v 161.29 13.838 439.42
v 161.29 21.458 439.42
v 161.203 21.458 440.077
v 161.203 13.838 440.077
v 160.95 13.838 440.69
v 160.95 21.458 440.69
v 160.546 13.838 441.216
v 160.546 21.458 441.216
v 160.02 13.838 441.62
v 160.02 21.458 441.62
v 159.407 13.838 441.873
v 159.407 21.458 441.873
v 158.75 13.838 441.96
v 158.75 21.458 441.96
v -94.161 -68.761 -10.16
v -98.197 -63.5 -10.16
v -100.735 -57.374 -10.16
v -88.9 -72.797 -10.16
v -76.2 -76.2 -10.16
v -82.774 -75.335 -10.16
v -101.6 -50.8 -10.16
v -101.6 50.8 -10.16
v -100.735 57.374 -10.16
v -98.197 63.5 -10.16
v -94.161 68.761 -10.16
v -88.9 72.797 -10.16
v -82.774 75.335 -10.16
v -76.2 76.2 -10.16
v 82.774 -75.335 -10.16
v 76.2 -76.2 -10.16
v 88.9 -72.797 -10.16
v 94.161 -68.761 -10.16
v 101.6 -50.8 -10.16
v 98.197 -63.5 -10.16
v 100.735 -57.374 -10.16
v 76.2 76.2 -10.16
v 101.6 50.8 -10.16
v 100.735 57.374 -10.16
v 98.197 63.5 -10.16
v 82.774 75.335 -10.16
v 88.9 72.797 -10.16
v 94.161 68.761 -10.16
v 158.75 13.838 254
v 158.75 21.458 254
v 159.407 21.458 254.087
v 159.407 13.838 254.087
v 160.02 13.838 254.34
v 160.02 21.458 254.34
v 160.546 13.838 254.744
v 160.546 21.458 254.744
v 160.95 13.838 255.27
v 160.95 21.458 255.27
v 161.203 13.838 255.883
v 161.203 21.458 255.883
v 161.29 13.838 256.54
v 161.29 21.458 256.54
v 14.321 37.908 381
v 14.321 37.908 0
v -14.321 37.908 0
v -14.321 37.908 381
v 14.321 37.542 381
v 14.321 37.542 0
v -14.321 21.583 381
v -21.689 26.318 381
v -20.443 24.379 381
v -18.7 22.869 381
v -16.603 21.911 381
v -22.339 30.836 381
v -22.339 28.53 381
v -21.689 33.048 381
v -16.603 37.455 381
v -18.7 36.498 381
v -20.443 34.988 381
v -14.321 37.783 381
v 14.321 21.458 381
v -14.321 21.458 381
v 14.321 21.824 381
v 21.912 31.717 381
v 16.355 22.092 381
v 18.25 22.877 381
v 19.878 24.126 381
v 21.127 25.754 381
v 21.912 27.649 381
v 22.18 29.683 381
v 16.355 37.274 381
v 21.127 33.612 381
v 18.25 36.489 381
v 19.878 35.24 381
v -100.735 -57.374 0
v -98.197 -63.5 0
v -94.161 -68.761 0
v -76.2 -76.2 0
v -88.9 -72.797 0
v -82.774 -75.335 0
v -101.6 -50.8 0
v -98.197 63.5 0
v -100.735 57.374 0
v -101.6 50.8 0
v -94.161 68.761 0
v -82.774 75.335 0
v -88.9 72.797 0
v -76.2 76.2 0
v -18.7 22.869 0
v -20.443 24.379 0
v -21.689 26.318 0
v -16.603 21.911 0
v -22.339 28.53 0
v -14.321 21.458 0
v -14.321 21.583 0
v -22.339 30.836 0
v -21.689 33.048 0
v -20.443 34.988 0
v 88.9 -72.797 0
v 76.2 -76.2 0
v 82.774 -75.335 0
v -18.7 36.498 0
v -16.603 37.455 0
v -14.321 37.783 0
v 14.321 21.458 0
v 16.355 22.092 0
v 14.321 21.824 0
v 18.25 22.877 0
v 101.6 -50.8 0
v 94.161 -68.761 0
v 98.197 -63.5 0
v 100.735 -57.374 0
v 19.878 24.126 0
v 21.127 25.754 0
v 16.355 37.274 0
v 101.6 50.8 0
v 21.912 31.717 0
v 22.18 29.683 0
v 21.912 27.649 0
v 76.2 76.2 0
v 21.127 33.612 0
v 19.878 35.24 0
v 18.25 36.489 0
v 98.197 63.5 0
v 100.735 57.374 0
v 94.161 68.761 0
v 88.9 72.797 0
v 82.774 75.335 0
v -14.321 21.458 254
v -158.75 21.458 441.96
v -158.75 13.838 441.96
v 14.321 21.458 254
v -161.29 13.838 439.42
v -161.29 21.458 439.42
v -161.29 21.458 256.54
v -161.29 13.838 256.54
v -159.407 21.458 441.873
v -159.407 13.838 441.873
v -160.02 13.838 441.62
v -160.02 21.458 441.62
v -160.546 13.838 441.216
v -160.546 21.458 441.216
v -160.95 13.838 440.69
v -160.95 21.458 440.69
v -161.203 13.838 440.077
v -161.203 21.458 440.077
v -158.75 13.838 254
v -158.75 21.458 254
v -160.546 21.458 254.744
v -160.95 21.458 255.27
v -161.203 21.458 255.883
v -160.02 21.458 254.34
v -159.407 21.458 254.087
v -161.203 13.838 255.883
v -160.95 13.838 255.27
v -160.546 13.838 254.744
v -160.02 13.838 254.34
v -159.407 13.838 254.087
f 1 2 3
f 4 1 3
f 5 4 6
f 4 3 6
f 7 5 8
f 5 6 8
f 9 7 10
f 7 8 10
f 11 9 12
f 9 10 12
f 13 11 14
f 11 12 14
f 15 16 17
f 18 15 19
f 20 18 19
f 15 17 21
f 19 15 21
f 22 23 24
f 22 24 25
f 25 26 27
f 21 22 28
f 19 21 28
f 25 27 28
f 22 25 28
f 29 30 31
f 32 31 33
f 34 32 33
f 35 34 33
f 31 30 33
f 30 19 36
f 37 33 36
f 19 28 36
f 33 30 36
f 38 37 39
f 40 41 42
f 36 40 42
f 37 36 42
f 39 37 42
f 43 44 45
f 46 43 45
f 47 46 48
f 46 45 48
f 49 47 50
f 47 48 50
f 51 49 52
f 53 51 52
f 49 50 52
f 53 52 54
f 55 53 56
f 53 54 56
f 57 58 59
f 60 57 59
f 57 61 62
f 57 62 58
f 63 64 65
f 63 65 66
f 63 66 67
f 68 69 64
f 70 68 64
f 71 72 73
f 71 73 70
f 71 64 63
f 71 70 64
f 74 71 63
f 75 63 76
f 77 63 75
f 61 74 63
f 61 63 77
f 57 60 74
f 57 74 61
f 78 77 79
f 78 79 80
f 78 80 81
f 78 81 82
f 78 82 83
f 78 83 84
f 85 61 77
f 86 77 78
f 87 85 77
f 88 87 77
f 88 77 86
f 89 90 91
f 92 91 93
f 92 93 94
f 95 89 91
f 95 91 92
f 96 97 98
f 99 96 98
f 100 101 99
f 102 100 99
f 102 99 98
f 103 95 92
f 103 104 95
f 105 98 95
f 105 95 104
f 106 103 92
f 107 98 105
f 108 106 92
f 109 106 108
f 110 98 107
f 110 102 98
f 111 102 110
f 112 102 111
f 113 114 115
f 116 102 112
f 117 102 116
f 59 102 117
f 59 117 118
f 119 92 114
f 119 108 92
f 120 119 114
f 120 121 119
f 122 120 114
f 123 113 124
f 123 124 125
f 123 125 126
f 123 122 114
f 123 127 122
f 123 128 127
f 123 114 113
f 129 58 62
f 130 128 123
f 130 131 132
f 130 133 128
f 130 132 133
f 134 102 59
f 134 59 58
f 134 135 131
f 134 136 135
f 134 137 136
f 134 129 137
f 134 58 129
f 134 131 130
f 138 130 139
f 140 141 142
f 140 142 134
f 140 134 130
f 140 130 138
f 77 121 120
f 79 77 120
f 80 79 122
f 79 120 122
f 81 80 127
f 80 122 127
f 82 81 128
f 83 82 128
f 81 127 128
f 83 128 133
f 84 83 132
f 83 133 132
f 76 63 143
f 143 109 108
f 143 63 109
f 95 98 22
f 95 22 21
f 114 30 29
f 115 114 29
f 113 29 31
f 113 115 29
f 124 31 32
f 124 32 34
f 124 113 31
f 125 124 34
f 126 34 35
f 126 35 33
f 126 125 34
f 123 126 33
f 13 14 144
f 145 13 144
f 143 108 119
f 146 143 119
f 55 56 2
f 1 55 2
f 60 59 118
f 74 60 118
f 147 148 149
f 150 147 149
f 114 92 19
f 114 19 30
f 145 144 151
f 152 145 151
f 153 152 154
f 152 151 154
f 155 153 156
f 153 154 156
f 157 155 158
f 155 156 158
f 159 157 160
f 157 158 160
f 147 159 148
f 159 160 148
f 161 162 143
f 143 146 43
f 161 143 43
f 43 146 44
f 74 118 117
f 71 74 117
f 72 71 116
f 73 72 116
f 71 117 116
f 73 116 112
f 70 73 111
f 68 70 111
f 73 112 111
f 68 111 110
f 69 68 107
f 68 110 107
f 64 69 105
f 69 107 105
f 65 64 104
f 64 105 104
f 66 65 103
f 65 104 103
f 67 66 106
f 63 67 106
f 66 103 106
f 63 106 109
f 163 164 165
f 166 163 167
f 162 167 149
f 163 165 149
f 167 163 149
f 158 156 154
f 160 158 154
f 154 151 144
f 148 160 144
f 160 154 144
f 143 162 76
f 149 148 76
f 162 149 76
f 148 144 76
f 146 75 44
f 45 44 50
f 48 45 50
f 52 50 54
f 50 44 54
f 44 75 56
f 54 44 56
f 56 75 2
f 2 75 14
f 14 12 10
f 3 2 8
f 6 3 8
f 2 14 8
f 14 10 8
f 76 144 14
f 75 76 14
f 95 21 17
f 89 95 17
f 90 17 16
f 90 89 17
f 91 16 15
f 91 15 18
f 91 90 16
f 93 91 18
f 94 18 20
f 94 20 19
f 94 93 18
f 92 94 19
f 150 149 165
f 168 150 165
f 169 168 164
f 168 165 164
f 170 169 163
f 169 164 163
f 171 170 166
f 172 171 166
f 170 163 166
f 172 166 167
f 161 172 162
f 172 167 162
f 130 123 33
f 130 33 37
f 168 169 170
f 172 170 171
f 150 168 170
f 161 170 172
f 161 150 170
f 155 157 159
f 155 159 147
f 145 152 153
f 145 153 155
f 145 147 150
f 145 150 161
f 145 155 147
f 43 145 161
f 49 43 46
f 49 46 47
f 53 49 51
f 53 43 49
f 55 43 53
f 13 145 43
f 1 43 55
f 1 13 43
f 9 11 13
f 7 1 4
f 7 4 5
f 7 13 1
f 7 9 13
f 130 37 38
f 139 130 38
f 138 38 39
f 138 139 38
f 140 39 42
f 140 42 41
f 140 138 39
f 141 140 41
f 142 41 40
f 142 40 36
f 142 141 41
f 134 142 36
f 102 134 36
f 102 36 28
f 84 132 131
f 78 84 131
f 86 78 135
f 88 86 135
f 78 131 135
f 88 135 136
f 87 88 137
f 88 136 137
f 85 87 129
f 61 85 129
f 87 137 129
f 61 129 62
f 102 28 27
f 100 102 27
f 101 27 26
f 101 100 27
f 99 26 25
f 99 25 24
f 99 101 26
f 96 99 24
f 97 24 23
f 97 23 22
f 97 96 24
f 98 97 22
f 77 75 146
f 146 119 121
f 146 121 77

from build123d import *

# Parameters (mm, degrees)
F1_DEPTH = 10.16
F3_DEPTH = 381
F5_DEPTH = 7.62


with BuildPart() as f1:
    # F0 (on Top) → F1 (new body)
    with BuildSketch(Plane.XY):
        with BuildLine():
            Line((-76.2, -76.2), (76.2, -76.2))
            ThreePointArc((76.2, -76.2), (94.1605122421, -68.7605122421), (101.6, -50.8))
            Line((101.6, -50.8), (101.6, 50.8))
            ThreePointArc((101.6, 50.8), (94.1605122421, 68.7605122421), (76.2, 76.2))
            Line((76.2, 76.2), (-76.2, 76.2))
            ThreePointArc((-76.2, 76.2), (-94.1605122421, 68.7605122421), (-101.6, 50.8))
            Line((-101.6, 50.8), (-101.6, -50.8))
            ThreePointArc((-101.6, -50.8), (-94.1605122421, -68.7605122421), (-76.2, -76.2))
        make_face()
    extrude(amount=-F1_DEPTH)

    # F2 (on face) → F3 (join)
    with BuildSketch(Plane.XY):
        with BuildLine():
            Line((-14.3209369853, 21.4582365006), (14.3209369853, 21.4582365006))
            Line((14.3209369853, 21.4582365006), (14.3209369853, 21.8244272492))
            ThreePointArc((14.3209369853, 21.8244272492), (6.4622604496, 29.6831037849), (14.3209369853, 37.5417803207))
            Line((14.3209369853, 37.5417803207), (14.3209369853, 37.9079710692))
            Line((14.3209369853, 37.9079710692), (-14.3209369853, 37.9079710692))
            Line((-14.3209369853, 37.9079710692), (-14.3209369853, 37.7833950656))
            ThreePointArc((-14.3209369853, 37.7833950656), (-8.5931660912, 35.410874679), (-6.2206457047, 29.6831037849))
            ThreePointArc((-6.2206457047, 29.6831037849), (-8.5931660912, 23.9553328908), (-14.3209369853, 21.5828125043))
            Line((-14.3209369853, 21.5828125043), (-14.3209369853, 21.4582365006))
        make_face()
        with BuildLine():
            ThreePointArc((14.3209369853, 37.5417803207), (6.4622604496, 29.6831037849), (14.3209369853, 21.8244272492))
            Line((14.3209369853, 21.8244272492), (14.3209369853, 37.5417803207))
        make_face()
        with BuildLine():
            Line((14.3209369853, 37.5417803207), (14.3209369853, 21.8244272492))
            ThreePointArc((14.3209369853, 21.8244272492), (19.8778604549, 24.1261803153), (22.1796135211, 29.6831037849))
            ThreePointArc((22.1796135211, 29.6831037849), (19.8778604549, 35.2400272545), (14.3209369853, 37.5417803207))
        make_face()
        with BuildLine():
            ThreePointArc((-14.3209369853, 37.7833950656), (-22.4212282659, 29.6831037849), (-14.3209369853, 21.5828125043))
            Line((-14.3209369853, 21.5828125043), (-14.3209369853, 37.7833950656))
        make_face()
        with BuildLine():
            Line((-14.3209369853, 37.7833950656), (-14.3209369853, 21.5828125043))
            ThreePointArc((-14.3209369853, 21.5828125043), (-8.5931660912, 23.9553328908), (-6.2206457047, 29.6831037849))
            ThreePointArc((-6.2206457047, 29.6831037849), (-8.5931660912, 35.410874679), (-14.3209369853, 37.7833950656))
        make_face()
    extrude(amount=F3_DEPTH)

    # F4 (on face) → F5 (join)
    with BuildSketch(Plane.XZ.offset(-21.4582365006)):
        with BuildLine():
            Line((-158.75, 254), (158.75, 254))
            ThreePointArc((158.75, 254), (160.5460512242, 254.7439487758), (161.29, 256.54))
            Line((161.29, 256.54), (161.29, 439.42))
            ThreePointArc((161.29, 439.42), (160.5460512242, 441.2160512242), (158.75, 441.96))
            Line((158.75, 441.96), (-158.75, 441.96))
            ThreePointArc((-158.75, 441.96), (-160.5460512242, 441.2160512242), (-161.29, 439.42))
            Line((-161.29, 439.42), (-161.29, 256.54))
            ThreePointArc((-161.29, 256.54), (-160.5460512242, 254.7439487758), (-158.75, 254))
        make_face()
    extrude(amount=F5_DEPTH)


solid = f1.part
